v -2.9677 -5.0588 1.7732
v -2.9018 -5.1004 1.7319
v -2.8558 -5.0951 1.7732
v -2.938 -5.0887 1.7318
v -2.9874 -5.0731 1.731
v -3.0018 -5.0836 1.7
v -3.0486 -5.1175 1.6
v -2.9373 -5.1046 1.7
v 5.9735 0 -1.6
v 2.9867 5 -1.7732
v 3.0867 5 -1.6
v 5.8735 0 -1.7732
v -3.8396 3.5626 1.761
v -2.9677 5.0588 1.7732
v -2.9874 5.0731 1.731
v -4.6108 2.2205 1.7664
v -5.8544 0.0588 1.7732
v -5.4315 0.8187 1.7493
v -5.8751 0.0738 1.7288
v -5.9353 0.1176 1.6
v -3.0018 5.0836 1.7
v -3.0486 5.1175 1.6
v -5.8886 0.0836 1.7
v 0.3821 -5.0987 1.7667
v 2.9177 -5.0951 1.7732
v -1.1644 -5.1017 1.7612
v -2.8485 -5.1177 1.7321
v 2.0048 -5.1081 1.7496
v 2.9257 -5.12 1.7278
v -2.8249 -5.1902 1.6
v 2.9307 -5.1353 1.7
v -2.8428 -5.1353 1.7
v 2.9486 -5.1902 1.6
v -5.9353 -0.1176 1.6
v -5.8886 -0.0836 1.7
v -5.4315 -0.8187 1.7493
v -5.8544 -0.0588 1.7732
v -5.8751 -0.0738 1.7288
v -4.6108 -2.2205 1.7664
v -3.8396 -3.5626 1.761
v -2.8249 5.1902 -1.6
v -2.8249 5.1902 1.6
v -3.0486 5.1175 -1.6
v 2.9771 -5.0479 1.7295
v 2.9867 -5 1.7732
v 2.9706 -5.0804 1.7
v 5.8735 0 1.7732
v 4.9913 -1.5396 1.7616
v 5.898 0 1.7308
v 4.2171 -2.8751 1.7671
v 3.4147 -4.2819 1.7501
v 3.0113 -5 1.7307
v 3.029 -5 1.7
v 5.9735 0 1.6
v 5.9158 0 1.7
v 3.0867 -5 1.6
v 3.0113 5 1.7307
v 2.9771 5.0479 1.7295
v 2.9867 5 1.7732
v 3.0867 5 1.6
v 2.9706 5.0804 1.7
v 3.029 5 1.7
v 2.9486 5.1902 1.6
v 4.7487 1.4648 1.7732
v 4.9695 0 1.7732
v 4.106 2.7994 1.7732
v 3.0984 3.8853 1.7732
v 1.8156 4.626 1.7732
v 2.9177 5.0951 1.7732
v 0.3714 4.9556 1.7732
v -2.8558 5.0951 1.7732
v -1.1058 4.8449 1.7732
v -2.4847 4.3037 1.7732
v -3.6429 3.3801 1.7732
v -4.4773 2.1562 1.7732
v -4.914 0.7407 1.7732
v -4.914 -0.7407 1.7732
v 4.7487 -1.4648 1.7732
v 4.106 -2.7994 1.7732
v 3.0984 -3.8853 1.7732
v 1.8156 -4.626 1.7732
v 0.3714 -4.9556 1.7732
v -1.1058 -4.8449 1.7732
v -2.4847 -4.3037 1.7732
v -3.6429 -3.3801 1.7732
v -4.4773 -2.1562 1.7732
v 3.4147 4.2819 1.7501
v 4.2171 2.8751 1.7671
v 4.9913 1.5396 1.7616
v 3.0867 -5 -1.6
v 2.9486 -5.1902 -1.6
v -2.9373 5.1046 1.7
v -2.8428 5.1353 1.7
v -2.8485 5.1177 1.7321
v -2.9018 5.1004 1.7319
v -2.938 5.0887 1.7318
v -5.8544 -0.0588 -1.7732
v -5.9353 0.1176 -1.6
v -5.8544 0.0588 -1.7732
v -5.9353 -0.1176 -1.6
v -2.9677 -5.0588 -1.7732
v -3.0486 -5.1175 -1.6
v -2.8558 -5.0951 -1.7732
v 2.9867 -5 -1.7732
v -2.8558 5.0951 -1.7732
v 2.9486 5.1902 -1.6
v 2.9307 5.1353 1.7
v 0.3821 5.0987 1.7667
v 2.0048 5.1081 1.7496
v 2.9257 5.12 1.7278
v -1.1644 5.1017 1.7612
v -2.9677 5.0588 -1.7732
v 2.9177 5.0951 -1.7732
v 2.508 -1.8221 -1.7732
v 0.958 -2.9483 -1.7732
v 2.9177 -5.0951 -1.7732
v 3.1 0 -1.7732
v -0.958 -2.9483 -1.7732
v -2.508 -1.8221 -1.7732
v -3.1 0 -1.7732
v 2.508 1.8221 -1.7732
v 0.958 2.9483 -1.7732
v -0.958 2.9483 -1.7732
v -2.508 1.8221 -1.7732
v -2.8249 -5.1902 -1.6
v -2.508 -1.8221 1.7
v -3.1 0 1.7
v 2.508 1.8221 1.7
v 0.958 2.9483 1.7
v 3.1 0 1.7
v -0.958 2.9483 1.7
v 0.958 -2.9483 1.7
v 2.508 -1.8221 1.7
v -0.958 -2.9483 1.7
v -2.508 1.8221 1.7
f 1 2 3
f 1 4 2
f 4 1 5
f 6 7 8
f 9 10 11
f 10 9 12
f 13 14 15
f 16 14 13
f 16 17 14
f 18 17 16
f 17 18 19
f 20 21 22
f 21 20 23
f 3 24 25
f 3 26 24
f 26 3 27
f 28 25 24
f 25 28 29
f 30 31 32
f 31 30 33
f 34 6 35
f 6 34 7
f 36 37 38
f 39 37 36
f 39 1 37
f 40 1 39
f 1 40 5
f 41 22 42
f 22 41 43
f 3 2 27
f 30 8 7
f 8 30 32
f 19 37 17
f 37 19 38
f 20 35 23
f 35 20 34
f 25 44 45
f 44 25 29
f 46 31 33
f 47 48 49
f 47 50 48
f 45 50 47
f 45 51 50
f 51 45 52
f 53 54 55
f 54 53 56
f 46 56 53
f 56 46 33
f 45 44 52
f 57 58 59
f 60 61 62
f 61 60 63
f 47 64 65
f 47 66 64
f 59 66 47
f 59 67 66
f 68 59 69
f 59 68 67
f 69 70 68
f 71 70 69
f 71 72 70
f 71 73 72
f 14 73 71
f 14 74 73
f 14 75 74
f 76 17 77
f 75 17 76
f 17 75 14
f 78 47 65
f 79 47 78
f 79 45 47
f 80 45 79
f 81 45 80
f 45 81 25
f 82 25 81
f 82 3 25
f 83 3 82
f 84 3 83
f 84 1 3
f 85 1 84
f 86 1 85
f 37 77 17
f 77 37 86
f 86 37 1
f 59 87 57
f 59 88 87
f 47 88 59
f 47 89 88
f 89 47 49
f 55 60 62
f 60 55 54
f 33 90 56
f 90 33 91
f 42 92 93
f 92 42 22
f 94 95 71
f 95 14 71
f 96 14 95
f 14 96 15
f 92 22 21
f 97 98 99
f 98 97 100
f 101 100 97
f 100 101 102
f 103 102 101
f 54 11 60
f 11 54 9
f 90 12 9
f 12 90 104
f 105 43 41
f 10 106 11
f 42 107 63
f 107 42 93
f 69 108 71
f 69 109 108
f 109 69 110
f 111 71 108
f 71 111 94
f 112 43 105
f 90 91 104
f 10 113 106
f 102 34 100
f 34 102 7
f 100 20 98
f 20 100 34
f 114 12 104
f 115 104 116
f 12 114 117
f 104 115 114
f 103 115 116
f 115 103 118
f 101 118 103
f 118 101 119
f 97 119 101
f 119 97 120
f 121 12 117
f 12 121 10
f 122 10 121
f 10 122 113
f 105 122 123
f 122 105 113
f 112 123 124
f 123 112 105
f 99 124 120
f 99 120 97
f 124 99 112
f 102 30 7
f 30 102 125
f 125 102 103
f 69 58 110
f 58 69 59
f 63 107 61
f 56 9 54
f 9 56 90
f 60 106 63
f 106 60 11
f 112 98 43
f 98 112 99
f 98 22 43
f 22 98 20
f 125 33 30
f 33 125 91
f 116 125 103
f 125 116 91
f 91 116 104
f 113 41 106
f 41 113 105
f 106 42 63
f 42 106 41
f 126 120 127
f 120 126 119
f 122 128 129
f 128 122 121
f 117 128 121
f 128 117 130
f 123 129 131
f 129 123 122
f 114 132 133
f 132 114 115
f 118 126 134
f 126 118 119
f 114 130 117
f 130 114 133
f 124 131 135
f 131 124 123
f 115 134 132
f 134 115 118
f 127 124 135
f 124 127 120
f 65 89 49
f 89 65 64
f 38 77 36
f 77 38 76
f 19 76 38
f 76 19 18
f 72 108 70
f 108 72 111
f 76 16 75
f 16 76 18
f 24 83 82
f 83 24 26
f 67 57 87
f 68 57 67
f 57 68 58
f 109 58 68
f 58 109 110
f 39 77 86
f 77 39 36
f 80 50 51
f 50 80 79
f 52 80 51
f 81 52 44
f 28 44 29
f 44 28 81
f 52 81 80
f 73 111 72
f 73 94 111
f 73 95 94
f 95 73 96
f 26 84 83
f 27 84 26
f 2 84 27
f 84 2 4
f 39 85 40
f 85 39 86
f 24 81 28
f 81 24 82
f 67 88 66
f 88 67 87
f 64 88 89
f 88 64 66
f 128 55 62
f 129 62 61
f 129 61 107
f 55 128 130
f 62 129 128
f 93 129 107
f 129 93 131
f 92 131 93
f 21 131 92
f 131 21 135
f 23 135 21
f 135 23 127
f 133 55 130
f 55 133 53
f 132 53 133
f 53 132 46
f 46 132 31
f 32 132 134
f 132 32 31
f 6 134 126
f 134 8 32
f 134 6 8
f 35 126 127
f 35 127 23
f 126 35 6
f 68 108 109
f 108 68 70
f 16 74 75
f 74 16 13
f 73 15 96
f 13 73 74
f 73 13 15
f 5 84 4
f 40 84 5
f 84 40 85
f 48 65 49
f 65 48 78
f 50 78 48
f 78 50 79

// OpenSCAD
// Parameters
across_flats = 10.0; //[5.0:20.0:0.1]
thickness = 3.2; //[1.6:6.4:0.1]
hole_diameter = 6.2; //[3.0:12.0:0.1]
chamfer_size = 0.3; //[0.1:1.0:0.05]
corner_round_radius = 0.2; //[0.0:0.8:0.05]
overlap = 0.8; //[0.5:2.0:0.1]
hex_circumradius = 5.7735; //[2.8867:11.547:0.0001]
hole_radius = 3.1; //[1.5:6.0:0.0001]

// Hexagonal Nut Body
module hex_nut_body() {
  linear_extrude(height = thickness, center = true) {
    polygon(points = [
      [hex_circumradius, 0],
      [hex_circumradius / 2, hex_circumradius * 0.866025403784],
      [-hex_circumradius / 2, hex_circumradius * 0.866025403784],
      [-hex_circumradius, 0],
      [-hex_circumradius / 2, -hex_circumradius * 0.866025403784],
      [hex_circumradius / 2, -hex_circumradius * 0.866025403784]
    ]);
  }
}

// Center Through Hole
module center_through_hole() {
  translate([0, 0, 0])
    cylinder(r = hole_radius, h = thickness + 2 * overlap, center = true);
}

// Top Edge Chamfer
module top_edge_chamfer() {
  translate([0, 0, thickness / 2 - chamfer_size / 2 + overlap / 2])
    cylinder(r1 = hex_circumradius + overlap, r2 = 0, h = chamfer_size, center = true);
}

// Bottom Edge Chamfer
module bottom_edge_chamfer() {
  translate([0, 0, -thickness / 2 + chamfer_size / 2 - overlap / 2])
    cylinder(r1 = hex_circumradius + overlap, r2 = 0, h = chamfer_size, center = true);
}

// Corner Rounding
module corner_rounding() {
  translate([0, 0, 0])
    sphere(r = corner_round_radius, center = true);
}

// Thread Detail (No-op)
module thread_detail() {
  // Placeholder for thread detail, not implemented
}

// Surface Markings (No-op)
module surface_markings() {
  // Placeholder for surface markings, not implemented
}

// Complete Model
module complete_model() {
  difference() {
    minkowski() {
      hex_nut_body();
      corner_rounding();
    }
    center_through_hole();
    top_edge_chamfer();
    bottom_edge_chamfer();
  }
}

// Final Output
color("Silver") complete_model();
